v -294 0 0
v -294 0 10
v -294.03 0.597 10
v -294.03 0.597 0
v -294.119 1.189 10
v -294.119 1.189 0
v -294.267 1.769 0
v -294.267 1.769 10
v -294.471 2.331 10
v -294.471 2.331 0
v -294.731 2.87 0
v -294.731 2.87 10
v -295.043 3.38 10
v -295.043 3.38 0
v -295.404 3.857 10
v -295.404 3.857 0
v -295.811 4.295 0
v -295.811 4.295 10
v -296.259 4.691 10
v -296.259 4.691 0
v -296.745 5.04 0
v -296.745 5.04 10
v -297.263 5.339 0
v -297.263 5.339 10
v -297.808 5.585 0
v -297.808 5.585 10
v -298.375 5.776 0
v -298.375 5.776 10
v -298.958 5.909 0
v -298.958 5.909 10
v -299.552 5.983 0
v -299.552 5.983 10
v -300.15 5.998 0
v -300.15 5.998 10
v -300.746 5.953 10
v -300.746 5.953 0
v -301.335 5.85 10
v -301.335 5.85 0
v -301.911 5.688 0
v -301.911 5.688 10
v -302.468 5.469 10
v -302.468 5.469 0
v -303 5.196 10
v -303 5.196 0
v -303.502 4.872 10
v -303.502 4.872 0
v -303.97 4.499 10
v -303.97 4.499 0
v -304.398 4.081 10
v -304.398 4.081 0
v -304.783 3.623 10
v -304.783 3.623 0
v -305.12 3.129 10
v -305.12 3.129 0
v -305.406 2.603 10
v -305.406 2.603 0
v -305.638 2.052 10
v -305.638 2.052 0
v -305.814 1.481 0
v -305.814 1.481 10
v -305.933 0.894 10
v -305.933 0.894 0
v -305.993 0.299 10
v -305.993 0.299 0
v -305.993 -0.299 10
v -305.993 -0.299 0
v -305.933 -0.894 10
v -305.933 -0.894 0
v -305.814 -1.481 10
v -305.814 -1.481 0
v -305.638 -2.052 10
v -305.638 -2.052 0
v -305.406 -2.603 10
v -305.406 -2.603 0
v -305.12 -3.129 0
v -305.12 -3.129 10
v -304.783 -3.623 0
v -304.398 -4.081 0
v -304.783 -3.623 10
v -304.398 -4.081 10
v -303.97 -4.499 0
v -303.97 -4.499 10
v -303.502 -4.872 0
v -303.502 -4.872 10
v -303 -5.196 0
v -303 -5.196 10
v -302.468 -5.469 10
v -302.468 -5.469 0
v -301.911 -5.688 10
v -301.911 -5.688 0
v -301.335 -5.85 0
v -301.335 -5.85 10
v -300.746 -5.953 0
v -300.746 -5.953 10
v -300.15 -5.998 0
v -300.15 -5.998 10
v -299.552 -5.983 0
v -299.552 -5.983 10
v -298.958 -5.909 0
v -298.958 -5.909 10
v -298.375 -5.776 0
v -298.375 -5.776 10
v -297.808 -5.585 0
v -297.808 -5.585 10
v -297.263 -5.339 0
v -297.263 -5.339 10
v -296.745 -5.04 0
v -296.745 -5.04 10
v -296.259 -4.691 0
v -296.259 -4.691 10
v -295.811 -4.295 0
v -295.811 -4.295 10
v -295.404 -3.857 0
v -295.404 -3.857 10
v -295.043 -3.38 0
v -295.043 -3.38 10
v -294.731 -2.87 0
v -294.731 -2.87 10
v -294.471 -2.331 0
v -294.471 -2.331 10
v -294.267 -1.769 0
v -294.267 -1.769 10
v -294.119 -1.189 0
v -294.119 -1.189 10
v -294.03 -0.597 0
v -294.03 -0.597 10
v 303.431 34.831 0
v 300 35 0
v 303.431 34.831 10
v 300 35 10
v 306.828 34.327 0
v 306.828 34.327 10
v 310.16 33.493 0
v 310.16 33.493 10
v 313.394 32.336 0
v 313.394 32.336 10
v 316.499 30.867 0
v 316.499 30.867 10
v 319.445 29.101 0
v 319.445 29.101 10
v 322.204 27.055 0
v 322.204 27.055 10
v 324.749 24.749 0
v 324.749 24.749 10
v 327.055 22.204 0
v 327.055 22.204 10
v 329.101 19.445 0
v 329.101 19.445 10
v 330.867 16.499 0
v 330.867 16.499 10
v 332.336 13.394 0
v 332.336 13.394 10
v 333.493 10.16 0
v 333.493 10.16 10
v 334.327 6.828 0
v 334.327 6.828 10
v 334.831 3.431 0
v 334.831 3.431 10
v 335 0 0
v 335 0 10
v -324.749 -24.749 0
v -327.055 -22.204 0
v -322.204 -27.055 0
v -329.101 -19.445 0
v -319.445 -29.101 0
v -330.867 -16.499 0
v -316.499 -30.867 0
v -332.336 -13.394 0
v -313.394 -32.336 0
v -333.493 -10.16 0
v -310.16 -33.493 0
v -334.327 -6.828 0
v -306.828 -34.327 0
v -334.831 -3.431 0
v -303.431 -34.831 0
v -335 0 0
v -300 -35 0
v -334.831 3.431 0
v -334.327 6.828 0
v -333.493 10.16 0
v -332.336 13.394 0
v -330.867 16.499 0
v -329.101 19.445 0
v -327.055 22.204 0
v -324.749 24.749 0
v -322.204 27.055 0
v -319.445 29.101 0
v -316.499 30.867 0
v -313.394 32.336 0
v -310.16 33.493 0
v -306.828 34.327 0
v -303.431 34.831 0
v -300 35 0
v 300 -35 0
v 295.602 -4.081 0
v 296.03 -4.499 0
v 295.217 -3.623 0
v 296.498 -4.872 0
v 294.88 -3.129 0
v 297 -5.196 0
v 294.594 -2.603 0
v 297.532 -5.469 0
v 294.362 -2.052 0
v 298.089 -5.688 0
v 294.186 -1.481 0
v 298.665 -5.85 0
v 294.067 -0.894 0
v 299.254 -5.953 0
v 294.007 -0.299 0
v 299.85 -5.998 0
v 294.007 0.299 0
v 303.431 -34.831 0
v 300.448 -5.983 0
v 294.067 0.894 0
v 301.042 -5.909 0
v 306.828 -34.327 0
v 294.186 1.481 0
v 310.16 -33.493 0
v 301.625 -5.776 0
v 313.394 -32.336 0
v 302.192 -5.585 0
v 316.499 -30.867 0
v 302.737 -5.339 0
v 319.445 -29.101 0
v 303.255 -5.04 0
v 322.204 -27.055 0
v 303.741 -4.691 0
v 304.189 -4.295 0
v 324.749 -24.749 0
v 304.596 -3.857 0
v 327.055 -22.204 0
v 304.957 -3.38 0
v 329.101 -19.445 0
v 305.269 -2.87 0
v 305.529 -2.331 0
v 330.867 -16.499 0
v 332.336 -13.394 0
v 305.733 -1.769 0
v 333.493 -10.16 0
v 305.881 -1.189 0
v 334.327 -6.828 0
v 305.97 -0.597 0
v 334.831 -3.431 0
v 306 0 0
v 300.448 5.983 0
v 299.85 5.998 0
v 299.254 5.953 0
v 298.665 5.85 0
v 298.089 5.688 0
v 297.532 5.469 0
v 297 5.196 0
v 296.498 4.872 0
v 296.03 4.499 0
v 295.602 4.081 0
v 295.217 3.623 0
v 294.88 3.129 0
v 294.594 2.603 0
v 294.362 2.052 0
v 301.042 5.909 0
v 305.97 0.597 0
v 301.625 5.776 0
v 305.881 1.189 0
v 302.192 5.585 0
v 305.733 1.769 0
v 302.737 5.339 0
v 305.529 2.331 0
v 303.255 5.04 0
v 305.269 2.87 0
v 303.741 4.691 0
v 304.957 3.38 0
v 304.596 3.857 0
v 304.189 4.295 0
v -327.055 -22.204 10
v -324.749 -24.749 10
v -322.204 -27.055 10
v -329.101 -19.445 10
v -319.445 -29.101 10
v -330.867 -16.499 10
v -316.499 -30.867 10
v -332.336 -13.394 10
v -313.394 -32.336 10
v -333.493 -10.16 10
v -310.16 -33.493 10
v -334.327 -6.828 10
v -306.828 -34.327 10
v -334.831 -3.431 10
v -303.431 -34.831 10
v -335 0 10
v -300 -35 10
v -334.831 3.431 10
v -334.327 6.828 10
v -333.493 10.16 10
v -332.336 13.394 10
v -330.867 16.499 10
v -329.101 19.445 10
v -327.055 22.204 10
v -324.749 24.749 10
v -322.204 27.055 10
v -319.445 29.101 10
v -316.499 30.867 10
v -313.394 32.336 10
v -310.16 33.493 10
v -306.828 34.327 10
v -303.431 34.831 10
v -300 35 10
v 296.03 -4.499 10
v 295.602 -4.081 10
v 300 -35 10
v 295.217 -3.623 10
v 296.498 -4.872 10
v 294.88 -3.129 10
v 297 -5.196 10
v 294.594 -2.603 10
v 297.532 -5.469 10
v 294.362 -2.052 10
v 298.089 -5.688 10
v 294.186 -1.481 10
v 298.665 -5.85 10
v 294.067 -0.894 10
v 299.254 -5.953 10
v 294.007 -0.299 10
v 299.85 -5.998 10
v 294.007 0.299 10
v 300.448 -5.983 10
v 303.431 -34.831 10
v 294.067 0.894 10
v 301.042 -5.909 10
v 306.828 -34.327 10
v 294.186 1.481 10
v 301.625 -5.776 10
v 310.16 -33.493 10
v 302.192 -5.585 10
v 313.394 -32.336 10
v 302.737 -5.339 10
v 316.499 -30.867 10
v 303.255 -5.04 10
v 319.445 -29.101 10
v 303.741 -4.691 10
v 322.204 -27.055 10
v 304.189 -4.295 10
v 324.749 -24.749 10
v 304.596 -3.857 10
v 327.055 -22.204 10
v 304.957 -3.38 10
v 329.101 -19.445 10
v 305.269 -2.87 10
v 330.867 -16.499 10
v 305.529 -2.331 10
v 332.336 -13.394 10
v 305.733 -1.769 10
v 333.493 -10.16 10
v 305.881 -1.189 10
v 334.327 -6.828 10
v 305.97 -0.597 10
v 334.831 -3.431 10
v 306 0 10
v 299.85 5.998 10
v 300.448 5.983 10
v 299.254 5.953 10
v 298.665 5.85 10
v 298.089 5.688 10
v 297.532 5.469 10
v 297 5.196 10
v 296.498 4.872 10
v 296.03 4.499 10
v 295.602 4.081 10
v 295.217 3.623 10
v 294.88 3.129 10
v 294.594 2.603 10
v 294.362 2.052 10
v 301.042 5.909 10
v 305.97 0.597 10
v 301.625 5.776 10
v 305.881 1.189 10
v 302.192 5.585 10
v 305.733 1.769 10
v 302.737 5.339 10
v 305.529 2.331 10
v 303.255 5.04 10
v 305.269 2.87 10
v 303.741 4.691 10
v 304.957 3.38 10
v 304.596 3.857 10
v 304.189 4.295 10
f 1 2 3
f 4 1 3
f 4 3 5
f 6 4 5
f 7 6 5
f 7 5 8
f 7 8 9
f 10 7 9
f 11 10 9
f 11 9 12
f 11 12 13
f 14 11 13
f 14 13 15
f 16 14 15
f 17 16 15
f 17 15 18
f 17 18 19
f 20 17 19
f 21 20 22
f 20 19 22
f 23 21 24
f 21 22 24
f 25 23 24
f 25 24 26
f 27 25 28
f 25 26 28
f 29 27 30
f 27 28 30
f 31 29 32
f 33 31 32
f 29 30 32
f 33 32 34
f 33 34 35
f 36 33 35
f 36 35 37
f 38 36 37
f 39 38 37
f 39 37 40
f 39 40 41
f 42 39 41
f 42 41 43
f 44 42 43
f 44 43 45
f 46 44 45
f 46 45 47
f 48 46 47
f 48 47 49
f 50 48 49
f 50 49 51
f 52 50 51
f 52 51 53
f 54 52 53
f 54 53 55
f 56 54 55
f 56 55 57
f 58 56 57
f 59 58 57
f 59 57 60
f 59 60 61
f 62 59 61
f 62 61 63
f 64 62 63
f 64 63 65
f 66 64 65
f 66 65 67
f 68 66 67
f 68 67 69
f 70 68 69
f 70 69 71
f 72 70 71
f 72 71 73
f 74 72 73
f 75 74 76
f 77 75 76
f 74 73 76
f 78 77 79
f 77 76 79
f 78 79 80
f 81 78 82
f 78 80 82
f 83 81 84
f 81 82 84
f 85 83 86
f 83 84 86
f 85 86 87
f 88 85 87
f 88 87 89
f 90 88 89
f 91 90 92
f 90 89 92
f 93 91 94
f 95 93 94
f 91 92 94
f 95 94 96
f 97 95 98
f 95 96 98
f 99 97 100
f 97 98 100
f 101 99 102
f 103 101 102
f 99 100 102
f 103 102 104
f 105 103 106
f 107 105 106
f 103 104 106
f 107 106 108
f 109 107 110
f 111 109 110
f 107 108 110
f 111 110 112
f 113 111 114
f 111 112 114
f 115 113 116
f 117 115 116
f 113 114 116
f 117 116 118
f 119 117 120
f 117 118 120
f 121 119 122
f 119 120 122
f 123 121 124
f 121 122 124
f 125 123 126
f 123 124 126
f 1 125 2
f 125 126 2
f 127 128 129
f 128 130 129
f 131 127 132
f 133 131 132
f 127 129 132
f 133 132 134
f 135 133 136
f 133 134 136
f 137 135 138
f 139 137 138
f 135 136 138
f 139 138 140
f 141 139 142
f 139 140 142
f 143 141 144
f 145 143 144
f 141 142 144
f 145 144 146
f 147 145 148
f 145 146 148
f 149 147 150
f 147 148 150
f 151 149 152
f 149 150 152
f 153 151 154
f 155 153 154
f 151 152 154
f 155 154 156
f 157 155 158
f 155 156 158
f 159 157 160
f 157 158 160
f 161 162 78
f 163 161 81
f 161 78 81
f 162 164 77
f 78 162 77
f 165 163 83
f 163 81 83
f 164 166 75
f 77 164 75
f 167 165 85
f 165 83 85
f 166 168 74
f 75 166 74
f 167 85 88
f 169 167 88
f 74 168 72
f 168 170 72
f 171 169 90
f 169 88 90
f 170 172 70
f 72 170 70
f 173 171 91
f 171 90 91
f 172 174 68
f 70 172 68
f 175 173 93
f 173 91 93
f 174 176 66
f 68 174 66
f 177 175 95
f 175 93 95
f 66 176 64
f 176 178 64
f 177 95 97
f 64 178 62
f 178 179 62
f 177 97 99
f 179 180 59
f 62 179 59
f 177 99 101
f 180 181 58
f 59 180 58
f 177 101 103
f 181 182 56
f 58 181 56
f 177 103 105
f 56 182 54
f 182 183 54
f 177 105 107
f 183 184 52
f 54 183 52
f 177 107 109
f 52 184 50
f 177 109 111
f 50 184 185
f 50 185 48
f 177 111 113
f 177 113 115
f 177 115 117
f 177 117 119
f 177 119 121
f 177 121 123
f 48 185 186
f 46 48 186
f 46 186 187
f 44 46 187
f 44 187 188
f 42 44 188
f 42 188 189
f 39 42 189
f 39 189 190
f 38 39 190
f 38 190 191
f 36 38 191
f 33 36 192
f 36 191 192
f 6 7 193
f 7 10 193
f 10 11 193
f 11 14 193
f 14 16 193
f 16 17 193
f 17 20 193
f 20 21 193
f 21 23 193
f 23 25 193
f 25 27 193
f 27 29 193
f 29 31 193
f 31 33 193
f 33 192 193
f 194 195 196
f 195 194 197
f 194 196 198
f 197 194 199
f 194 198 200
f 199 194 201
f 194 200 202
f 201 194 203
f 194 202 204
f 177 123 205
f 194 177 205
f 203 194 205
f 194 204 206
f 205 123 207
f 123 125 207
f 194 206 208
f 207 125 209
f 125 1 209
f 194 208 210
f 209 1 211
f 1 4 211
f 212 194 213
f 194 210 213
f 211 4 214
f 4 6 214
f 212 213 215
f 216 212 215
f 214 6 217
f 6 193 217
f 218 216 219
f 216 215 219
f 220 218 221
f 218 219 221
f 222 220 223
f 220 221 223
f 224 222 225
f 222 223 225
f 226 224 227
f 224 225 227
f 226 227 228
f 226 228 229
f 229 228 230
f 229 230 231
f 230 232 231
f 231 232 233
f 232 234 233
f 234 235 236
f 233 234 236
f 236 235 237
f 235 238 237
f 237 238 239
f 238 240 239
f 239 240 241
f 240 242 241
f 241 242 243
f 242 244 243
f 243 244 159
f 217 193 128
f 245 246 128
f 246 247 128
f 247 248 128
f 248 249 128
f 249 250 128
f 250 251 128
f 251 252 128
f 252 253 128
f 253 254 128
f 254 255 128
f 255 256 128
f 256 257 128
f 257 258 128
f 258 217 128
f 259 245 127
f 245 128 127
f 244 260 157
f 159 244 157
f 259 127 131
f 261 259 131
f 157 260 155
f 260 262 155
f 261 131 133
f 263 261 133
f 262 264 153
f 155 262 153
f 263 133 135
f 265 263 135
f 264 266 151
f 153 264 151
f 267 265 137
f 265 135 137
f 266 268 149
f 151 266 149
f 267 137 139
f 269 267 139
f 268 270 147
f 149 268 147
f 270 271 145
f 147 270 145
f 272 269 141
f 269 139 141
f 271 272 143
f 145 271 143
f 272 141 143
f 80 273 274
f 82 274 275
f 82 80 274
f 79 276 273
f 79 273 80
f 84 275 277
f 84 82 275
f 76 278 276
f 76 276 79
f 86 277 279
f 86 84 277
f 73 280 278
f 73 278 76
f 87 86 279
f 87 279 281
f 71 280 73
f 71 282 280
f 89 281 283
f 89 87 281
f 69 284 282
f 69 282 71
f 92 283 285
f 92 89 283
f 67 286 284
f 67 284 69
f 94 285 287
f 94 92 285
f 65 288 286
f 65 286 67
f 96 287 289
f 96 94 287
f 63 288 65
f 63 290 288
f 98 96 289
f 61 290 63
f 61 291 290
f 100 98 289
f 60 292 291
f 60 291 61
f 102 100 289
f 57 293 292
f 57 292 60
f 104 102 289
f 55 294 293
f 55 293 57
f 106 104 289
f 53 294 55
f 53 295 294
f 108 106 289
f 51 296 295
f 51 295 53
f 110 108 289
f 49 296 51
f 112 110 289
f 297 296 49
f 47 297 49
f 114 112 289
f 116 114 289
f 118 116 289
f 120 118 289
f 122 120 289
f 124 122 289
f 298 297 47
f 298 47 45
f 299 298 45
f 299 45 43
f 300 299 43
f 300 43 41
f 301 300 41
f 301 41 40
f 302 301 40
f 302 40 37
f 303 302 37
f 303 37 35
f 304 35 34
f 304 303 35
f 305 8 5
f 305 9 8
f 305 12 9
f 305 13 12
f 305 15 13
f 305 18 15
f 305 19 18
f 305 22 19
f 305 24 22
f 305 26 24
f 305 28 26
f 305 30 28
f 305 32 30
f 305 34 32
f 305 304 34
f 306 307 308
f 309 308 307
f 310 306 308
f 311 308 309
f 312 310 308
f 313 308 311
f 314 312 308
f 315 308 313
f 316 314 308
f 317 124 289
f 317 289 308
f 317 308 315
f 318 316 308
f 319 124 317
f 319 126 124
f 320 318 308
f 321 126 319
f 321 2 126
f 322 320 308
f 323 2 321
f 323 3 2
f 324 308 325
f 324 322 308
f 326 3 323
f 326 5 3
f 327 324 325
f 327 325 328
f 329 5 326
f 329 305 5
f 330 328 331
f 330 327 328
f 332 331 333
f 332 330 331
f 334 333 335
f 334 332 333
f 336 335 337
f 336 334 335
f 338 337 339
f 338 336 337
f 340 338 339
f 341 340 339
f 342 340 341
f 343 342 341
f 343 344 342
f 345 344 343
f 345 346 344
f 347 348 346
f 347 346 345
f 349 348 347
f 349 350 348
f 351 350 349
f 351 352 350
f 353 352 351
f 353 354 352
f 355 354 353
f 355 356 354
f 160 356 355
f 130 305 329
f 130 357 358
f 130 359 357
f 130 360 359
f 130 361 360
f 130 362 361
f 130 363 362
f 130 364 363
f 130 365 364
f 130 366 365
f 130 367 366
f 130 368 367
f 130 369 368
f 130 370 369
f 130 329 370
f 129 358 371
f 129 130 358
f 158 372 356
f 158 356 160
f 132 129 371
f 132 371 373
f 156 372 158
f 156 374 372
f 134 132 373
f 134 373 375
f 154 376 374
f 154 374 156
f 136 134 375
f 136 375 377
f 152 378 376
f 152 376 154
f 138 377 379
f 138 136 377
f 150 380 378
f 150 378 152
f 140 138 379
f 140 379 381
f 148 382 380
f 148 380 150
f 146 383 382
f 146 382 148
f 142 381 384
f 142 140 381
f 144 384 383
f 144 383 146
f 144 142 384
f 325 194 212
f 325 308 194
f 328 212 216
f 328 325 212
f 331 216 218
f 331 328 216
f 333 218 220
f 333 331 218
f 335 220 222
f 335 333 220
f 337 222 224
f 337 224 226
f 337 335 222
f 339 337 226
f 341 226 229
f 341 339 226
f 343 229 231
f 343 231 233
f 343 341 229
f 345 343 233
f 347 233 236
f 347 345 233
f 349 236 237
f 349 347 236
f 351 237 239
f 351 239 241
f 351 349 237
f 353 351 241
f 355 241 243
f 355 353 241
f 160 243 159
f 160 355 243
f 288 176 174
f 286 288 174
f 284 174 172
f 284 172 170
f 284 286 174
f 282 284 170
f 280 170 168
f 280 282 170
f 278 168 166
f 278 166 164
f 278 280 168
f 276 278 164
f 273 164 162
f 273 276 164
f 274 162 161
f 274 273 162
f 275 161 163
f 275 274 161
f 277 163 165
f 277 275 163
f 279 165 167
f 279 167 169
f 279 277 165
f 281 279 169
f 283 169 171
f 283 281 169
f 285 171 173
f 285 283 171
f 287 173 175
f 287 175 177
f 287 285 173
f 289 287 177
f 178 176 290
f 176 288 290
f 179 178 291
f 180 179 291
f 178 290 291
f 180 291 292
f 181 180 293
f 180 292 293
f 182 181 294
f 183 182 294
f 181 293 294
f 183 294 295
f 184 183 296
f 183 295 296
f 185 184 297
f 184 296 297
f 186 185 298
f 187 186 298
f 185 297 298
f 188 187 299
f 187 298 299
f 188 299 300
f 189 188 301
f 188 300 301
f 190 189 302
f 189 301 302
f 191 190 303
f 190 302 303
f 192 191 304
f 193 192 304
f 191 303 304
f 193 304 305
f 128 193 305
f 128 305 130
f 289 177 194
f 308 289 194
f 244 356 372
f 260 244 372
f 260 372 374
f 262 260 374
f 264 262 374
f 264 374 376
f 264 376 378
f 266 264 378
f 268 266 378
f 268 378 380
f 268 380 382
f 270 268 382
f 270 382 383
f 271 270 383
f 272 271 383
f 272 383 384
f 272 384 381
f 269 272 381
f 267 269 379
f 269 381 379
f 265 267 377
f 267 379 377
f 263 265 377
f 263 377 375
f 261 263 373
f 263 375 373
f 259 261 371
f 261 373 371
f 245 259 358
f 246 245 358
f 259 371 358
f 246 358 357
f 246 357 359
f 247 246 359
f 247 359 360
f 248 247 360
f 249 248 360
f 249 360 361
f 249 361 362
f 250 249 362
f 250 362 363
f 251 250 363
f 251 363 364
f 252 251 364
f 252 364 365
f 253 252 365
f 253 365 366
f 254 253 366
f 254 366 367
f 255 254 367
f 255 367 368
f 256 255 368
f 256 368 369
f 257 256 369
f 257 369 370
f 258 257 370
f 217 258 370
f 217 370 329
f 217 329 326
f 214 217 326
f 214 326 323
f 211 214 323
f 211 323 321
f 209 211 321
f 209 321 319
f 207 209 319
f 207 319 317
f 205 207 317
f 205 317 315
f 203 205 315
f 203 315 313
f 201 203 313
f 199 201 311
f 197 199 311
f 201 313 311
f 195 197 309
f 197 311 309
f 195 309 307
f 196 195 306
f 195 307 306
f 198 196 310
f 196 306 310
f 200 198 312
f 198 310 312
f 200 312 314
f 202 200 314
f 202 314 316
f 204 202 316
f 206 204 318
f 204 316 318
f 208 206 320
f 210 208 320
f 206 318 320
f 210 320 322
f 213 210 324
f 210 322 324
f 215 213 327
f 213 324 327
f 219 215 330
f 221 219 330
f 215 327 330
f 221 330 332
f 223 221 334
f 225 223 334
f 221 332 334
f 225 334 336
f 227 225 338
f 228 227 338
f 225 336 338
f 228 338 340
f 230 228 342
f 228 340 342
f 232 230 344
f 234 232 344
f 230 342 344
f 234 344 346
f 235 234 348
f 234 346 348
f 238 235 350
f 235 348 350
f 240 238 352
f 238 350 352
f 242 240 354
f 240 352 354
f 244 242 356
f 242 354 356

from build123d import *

# Parameters (mm, degrees)
SKETCH1_W           = 670
SKETCH1_H           = 70
BOSS_EXTRUDE1_DEPTH = 10
SKETCH2_R           = 6
CUT_EXTRUDE1_DEPTH  = 337.97180891
FILLET1_R           = 35


with BuildPart() as part:
    # Sketch1 → Boss-Extrude1 (new body)
    with BuildSketch(Plane.XY):
        Rectangle(SKETCH1_W, SKETCH1_H)
    extrude(amount=BOSS_EXTRUDE1_DEPTH)

    # Sketch2 → Cut-Extrude1 (cut, through all)
    with BuildSketch(Plane.XY.offset(10)):
        with Locations((-300, 0)):
            Circle(SKETCH2_R)
        with Locations((300, 0)):
            Circle(SKETCH2_R)
    extrude(amount=-CUT_EXTRUDE1_DEPTH, mode=Mode.SUBTRACT)

    # Fillet1
    fillet1_edges = [part.edges().sort_by_distance(p)[0] for p in [
        (335, -35, 5),
        (335, 35, 5),
        (-335, -35, 5),
        (-335, 35, 5),
    ]]
    fillet(fillet1_edges, radius=FILLET1_R - 0.0001)  # a hair under: the kernel refuses the full size


solid = part.part
